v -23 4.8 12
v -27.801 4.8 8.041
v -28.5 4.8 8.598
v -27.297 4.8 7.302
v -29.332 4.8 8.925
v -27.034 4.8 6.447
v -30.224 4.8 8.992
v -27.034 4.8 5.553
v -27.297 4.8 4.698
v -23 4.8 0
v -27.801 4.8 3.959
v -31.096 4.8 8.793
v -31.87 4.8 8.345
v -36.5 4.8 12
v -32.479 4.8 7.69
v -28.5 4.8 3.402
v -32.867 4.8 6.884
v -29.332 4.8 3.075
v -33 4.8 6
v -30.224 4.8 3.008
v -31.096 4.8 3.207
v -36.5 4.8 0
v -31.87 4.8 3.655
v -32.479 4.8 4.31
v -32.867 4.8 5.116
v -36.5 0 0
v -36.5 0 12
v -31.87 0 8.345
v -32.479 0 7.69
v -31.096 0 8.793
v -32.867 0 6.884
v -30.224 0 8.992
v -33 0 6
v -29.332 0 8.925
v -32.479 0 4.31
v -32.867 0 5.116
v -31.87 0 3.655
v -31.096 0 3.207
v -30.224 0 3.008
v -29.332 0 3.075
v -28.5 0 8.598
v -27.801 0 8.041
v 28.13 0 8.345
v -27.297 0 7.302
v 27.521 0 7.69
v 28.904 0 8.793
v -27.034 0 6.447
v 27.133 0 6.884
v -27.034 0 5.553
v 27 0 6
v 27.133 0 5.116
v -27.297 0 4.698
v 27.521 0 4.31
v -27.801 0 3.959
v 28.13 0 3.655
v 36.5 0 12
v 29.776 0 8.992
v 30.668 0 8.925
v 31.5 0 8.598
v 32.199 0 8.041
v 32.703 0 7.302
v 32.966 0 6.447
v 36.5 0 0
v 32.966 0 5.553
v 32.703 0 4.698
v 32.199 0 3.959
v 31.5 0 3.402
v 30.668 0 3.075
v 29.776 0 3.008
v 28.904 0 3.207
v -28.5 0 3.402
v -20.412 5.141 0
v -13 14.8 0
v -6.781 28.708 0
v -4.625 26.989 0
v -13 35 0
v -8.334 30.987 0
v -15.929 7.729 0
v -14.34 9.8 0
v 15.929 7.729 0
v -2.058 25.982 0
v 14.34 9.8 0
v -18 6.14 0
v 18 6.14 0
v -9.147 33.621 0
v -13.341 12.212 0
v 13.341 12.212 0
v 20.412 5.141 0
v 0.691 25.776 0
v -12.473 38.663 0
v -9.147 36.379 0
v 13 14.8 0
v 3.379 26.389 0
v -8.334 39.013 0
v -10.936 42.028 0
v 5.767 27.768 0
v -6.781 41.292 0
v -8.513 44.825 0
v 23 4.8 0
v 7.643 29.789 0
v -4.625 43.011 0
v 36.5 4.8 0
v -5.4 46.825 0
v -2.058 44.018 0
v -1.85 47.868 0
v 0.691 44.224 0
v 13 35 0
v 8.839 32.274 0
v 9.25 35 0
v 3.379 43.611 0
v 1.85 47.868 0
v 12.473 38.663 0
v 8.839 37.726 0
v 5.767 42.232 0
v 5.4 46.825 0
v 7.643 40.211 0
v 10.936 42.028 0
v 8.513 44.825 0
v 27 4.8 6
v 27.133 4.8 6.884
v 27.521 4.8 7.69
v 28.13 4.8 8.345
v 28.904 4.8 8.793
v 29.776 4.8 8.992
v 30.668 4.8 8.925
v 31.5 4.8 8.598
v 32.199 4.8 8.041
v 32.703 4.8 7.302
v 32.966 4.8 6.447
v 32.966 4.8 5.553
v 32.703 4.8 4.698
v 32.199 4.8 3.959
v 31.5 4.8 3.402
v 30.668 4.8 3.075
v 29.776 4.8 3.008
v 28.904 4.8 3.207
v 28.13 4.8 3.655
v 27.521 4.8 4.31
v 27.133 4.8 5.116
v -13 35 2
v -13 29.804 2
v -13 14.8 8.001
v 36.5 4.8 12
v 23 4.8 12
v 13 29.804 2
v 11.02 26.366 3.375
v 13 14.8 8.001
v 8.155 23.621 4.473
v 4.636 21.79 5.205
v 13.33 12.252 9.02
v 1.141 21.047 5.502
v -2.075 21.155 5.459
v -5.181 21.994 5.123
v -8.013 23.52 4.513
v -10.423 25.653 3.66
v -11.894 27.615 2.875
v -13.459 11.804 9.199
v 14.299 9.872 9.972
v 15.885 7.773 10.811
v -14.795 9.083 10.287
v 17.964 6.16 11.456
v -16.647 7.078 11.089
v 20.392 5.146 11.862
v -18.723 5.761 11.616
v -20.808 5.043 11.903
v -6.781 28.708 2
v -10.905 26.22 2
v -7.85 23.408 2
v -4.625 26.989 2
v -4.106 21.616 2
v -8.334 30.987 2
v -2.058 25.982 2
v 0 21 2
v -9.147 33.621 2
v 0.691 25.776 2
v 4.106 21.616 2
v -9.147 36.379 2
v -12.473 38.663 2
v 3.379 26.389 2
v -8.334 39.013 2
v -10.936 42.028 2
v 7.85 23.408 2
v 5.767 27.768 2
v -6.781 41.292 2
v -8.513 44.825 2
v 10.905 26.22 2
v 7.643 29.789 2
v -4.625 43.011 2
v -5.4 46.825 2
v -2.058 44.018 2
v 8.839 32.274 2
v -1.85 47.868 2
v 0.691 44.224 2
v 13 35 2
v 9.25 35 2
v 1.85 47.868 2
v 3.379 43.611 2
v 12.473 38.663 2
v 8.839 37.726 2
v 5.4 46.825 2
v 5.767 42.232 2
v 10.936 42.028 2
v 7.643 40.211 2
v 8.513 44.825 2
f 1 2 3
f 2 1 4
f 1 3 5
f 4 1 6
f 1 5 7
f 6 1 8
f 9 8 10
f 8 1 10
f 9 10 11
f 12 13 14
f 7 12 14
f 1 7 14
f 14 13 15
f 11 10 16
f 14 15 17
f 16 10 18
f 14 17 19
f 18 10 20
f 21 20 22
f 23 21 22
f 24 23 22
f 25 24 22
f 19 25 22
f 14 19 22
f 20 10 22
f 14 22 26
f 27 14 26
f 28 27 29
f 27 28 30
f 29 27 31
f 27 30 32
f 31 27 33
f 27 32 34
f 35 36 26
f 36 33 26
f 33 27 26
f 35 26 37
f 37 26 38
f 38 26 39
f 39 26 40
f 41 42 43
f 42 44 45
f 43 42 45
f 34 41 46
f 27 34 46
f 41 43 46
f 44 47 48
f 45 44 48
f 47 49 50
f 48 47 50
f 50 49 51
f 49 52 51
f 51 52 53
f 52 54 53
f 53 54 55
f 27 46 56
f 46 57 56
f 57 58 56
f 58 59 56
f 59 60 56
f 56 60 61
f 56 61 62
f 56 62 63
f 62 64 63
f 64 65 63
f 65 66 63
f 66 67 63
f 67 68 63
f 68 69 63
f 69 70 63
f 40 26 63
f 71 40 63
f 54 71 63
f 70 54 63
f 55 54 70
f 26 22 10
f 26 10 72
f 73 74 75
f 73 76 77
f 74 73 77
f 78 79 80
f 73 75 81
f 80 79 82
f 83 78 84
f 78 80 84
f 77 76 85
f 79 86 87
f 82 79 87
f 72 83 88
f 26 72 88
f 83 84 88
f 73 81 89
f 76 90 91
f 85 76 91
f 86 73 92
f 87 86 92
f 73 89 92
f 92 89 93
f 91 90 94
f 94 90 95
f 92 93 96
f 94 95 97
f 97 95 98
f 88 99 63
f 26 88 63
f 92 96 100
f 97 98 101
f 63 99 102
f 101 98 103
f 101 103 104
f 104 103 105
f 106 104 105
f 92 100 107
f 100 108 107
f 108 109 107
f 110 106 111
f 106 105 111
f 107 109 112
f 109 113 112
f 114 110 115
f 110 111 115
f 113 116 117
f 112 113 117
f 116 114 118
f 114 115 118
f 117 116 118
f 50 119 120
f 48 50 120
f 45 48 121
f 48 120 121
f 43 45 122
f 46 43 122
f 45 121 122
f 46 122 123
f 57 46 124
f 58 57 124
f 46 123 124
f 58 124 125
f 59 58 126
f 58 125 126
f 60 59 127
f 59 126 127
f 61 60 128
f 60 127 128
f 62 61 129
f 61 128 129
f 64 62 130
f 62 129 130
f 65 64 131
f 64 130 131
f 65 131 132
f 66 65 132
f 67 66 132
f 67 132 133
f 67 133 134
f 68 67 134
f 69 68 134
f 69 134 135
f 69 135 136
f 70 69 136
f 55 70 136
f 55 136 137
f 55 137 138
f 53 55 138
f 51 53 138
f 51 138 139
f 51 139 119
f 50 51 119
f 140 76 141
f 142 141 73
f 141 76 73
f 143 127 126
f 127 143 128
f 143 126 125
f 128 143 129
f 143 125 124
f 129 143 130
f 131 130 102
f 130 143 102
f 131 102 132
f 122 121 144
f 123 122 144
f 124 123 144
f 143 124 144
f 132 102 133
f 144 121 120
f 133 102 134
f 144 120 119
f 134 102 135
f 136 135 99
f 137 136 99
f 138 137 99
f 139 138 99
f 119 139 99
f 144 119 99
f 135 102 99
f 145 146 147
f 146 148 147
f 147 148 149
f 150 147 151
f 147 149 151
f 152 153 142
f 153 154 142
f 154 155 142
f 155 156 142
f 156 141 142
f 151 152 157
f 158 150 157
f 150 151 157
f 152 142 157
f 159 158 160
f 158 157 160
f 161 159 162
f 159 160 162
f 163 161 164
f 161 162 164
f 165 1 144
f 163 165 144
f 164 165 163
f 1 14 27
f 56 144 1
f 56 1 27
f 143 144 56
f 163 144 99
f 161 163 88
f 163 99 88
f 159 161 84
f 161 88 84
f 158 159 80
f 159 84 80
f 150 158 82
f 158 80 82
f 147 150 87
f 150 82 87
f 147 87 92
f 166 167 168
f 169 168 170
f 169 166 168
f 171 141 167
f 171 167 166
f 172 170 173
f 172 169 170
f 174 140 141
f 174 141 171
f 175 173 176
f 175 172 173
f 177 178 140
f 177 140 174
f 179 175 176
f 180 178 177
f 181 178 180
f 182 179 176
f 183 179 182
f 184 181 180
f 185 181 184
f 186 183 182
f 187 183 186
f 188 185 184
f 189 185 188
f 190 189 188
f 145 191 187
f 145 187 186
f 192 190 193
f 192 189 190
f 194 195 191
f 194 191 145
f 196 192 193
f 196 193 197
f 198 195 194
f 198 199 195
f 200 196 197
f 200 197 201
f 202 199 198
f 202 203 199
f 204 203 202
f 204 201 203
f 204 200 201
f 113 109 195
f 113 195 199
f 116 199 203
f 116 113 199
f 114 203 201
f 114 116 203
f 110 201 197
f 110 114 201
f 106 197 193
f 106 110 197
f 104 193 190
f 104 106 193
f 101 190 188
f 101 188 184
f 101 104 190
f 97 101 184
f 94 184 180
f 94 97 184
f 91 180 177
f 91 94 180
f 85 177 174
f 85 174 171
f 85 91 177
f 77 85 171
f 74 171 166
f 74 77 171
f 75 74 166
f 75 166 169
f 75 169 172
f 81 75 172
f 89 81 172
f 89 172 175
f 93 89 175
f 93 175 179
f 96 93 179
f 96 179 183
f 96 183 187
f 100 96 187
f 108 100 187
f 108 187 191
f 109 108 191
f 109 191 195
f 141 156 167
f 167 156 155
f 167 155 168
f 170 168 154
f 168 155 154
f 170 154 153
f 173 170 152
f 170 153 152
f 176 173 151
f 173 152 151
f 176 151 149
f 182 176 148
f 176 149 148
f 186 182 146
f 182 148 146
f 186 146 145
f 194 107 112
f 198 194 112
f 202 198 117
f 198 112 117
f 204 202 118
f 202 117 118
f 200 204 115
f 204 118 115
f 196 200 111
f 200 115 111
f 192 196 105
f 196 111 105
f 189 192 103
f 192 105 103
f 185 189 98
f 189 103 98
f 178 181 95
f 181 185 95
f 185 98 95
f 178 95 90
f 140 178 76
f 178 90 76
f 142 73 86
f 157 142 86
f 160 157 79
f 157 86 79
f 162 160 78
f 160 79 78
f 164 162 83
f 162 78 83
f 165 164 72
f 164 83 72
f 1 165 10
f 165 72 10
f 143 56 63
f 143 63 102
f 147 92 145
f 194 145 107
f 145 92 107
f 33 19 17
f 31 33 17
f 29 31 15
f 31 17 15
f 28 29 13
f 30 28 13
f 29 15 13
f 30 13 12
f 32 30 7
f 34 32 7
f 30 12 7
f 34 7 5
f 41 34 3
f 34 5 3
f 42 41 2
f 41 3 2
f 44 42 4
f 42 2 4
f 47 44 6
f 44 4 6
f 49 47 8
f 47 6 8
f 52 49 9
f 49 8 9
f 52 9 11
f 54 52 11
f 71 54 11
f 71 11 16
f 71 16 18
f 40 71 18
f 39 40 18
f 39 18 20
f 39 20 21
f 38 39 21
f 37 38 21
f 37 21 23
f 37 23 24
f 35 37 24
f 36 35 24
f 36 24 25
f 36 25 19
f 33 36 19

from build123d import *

# Parameters (mm, degrees)
SKETCH1_R           = 9.25
BOSS_EXTRUDE1_DEPTH = 12
SKETCH2_R           = 3
CUT_EXTRUDE1_DEPTH  = 5.8
SKETCH3_R           = 14
CUT_EXTRUDE2_DEPTH  = 10
CUT_EXTRUDE3_DEPTH  = 74


with BuildPart() as part:
    # Sketch1 → Boss-Extrude1 (new body)
    with BuildSketch(Plane.XY):
        with BuildLine():
            Line((-36.5, 0), (36.5, 0))
            Line((36.5, 0), (36.5, 4.8))
            Line((36.5, 4.8), (23, 4.8))
            ThreePointArc((23, 4.8), (15.928932188, 7.728932188), (13, 14.8))
            Line((13, 14.8), (13, 35))
            ThreePointArc((13, 35), (0, 48), (-13, 35))
            Line((-13, 35), (-13, 14.8))
            ThreePointArc((-13, 14.8), (-15.928932188, 7.728932188), (-23, 4.8))
            Line((-23, 4.8), (-36.5, 4.8))
            Line((-36.5, 4.8), (-36.5, 0))
        make_face()
        with Locations((0, 35)):
            Circle(SKETCH1_R, mode=Mode.SUBTRACT)
    extrude(amount=BOSS_EXTRUDE1_DEPTH)

    # Sketch2 → Cut-Extrude1 (cut, through all)
    with BuildSketch(Plane(origin=(0, 4.8, 0), x_dir=(1, 0, 0), z_dir=(0, 1, 0))):
        with Locations(Location((-30, -6, 0), (0, 0, 180))):  # turned: the seam where the file's is
            Circle(SKETCH2_R)
        with Locations(Location((30, -6, 0), (0, 0, 180))):  # turned: the seam where the file's is
            Circle(SKETCH2_R)
    extrude(amount=-CUT_EXTRUDE1_DEPTH, mode=Mode.SUBTRACT)

    # Sketch3 → Cut-Extrude2 (cut)
    with BuildSketch(Plane.XY.offset(12)):
        with Locations((0, 35)):
            Circle(SKETCH3_R)
    extrude(amount=-CUT_EXTRUDE2_DEPTH, mode=Mode.SUBTRACT)

    # Sketch4 → Cut-Extrude3 (cut, through all)
    with BuildSketch(Plane.ZY.offset(36.5)):
        Polygon((2, 29.803847577), (12, 4.8), (12, 29.803847577), align=None)
    extrude(amount=-CUT_EXTRUDE3_DEPTH, mode=Mode.SUBTRACT)


solid = part.part
